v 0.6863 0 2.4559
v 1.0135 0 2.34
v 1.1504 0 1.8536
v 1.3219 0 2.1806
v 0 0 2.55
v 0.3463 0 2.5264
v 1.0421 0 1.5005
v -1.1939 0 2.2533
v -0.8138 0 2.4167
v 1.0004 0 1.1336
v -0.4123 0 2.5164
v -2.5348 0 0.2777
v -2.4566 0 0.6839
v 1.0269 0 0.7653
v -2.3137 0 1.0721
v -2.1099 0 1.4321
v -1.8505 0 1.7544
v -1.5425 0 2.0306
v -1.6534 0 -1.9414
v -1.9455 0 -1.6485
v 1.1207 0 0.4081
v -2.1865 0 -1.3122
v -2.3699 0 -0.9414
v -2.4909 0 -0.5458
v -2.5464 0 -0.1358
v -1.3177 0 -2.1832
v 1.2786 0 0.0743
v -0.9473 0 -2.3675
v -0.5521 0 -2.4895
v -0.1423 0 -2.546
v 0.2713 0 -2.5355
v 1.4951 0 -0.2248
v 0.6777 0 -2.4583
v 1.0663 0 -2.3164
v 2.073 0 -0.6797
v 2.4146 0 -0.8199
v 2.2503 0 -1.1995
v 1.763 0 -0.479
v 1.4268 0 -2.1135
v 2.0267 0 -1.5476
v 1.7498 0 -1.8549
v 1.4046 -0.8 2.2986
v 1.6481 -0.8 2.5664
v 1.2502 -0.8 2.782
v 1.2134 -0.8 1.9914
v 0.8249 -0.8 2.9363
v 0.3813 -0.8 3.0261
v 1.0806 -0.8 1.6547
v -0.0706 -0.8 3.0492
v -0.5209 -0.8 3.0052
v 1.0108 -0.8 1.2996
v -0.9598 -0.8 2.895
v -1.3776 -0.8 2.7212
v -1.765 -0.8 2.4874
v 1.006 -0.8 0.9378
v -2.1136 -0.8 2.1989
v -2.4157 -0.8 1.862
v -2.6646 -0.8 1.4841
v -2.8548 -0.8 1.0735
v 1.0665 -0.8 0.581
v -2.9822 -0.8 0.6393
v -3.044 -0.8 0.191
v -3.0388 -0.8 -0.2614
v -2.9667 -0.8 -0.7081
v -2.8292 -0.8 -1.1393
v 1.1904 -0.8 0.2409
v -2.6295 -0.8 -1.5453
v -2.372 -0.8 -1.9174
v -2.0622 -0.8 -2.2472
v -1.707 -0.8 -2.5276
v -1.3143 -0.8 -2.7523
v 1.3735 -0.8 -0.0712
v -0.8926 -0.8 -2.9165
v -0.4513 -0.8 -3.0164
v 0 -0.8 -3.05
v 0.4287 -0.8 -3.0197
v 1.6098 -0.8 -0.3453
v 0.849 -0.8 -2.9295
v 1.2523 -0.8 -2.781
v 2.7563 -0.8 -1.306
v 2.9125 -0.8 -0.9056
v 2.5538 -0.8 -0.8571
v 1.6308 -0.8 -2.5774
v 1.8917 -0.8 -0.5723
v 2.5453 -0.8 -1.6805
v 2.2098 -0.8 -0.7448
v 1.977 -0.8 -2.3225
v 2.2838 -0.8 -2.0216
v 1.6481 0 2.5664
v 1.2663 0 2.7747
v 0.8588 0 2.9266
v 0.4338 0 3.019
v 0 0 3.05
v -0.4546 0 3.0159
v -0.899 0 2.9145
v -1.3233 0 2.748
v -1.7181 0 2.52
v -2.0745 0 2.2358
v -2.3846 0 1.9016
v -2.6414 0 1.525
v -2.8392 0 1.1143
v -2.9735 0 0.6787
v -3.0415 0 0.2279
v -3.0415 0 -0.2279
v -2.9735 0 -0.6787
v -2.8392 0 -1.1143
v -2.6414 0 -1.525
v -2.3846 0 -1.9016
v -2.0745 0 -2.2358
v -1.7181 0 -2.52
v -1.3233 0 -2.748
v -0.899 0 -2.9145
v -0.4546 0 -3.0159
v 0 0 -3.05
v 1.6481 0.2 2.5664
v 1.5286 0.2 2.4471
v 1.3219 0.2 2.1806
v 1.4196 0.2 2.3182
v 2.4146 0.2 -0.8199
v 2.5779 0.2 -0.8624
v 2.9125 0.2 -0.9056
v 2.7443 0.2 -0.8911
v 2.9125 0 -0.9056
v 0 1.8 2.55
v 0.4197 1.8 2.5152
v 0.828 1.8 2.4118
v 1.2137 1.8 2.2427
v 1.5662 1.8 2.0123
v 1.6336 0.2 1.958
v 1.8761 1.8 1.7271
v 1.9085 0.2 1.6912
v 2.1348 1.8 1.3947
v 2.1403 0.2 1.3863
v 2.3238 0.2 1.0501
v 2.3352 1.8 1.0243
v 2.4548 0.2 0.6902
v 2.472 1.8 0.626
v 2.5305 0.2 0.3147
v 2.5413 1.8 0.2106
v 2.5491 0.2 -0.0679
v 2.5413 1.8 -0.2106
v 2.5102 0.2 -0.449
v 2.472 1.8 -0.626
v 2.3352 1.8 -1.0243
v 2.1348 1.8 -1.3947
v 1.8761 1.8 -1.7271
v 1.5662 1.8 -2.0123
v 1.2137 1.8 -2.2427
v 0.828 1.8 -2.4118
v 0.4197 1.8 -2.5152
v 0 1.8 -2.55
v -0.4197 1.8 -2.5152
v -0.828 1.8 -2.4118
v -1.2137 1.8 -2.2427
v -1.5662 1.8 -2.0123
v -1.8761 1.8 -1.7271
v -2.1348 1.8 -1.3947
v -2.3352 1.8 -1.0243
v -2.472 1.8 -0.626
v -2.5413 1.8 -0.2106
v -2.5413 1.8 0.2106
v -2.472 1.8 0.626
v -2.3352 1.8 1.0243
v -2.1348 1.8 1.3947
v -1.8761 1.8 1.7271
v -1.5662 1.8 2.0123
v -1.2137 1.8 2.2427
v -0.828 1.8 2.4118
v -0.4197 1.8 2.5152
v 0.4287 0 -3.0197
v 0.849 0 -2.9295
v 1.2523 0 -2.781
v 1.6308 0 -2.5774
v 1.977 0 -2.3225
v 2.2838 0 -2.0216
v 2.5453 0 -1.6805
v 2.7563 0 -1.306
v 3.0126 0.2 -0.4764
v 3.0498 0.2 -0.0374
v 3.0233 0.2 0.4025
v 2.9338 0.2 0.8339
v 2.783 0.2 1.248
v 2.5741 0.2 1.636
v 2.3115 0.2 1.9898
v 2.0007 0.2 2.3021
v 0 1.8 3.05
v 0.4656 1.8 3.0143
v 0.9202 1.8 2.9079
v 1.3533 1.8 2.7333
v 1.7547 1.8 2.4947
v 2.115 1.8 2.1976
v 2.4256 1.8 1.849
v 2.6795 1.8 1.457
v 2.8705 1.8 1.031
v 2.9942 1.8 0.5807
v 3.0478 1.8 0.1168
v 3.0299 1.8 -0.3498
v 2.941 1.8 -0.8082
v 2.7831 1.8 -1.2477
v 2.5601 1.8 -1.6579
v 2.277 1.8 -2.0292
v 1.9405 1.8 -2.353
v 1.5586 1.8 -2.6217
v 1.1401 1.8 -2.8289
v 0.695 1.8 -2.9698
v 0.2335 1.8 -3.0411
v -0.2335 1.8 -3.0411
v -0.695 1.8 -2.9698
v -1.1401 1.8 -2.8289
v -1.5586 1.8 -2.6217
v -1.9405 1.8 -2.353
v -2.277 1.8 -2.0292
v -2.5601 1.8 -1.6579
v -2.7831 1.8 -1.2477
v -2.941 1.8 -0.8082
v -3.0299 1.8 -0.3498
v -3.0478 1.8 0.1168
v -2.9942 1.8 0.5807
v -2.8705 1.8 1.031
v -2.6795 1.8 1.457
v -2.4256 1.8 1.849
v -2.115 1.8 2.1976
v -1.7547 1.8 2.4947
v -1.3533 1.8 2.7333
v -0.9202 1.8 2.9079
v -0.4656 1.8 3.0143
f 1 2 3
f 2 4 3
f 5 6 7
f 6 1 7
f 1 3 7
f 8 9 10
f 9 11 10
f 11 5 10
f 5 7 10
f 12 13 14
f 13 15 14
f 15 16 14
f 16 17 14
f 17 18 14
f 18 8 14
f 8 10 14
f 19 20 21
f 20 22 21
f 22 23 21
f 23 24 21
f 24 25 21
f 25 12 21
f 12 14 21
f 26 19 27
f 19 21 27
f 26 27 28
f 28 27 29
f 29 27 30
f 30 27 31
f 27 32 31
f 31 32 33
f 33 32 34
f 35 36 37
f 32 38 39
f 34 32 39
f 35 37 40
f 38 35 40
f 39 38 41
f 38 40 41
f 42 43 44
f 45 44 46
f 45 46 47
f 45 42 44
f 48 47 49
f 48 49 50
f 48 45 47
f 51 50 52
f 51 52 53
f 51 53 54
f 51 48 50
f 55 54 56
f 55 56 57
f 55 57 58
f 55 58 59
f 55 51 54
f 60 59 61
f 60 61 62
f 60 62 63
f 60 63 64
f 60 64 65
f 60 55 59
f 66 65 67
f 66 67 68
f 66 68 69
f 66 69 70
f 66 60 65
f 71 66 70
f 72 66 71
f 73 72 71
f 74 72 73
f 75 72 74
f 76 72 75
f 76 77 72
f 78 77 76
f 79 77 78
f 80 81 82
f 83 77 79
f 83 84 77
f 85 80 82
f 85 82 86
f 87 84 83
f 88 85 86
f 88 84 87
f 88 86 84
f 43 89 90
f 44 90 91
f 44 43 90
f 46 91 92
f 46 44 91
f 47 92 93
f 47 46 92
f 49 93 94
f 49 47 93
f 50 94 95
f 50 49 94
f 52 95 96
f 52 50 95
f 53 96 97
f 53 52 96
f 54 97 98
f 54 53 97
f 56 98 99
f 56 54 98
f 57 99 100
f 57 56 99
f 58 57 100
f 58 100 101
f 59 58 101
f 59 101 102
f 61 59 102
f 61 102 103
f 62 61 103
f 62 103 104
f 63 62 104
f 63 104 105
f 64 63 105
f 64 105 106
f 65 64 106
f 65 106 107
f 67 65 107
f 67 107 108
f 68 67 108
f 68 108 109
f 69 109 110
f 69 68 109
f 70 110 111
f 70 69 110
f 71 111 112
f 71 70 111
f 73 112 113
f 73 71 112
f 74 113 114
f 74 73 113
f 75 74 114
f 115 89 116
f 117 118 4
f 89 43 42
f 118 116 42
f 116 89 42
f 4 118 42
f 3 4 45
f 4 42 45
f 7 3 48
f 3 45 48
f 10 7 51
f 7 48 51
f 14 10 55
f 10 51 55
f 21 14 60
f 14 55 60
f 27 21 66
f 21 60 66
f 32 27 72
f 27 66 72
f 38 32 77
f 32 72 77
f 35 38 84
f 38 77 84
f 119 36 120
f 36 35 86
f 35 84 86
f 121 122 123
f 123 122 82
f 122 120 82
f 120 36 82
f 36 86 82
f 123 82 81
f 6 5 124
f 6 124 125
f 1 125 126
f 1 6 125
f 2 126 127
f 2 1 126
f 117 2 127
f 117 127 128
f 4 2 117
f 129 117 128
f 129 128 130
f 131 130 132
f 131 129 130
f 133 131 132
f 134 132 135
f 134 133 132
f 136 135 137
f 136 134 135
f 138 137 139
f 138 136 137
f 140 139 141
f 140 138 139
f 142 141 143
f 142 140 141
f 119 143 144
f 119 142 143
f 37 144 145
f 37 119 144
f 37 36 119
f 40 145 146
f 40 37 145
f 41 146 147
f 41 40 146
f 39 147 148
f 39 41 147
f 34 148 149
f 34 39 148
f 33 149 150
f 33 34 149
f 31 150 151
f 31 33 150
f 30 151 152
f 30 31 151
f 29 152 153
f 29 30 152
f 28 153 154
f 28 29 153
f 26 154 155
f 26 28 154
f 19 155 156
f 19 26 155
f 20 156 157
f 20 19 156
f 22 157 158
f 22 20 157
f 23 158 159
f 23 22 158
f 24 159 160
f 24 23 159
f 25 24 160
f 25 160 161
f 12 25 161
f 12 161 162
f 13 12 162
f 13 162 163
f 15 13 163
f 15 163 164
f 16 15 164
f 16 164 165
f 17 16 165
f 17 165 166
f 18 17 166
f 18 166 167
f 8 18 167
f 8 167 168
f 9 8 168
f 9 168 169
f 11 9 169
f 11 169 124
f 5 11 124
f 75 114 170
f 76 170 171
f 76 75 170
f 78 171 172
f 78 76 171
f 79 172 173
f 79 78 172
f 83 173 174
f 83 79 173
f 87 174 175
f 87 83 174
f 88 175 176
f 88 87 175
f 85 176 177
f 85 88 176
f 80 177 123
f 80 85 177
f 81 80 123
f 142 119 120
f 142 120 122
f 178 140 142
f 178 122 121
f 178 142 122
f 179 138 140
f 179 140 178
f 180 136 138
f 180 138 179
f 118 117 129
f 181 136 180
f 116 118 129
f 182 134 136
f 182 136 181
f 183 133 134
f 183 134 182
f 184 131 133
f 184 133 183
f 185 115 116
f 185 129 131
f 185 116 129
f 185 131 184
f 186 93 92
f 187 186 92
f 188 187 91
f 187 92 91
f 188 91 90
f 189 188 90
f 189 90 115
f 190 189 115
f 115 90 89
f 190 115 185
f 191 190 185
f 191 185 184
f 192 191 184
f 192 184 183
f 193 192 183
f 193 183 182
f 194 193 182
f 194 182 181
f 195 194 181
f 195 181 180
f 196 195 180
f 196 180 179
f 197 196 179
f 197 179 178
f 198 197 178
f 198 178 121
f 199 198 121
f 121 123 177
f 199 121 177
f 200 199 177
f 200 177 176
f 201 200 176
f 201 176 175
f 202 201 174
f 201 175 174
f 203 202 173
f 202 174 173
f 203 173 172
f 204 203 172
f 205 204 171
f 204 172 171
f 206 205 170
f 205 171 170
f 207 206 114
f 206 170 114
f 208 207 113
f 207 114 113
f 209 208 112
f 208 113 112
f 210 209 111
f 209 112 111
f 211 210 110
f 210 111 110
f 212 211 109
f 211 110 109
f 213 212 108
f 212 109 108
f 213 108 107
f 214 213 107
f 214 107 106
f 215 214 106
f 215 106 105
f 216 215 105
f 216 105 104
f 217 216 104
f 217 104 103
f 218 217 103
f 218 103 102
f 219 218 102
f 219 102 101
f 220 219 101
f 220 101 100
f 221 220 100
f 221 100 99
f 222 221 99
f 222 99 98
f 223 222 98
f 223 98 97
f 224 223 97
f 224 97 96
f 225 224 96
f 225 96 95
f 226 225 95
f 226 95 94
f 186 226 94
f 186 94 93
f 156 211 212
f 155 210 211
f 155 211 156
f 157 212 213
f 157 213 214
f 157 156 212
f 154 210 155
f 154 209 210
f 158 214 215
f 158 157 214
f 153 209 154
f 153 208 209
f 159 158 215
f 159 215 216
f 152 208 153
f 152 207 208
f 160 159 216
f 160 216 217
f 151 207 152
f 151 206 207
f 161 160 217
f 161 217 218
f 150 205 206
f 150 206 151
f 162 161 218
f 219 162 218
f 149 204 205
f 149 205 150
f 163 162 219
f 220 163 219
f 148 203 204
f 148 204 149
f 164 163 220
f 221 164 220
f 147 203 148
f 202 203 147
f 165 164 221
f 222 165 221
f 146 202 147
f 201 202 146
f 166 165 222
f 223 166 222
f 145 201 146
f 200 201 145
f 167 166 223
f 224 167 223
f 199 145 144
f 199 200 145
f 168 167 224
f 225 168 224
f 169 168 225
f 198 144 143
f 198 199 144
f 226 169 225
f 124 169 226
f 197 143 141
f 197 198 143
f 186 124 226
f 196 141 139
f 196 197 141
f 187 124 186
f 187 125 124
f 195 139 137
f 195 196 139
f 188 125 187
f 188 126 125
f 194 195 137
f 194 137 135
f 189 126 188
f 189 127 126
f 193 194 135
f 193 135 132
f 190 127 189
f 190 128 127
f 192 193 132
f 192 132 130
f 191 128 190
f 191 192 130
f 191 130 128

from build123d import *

# Parameters (mm, degrees)
SKETCH_1_R          = 3.05
SKETCH_1_R_2        = 2.55
EXTRUDE_1_DEPTH     = 1.8
EXTRUDE_START       = 0.8
SKETCH_2_R          = 3.05
EXTRUDE_2_DEPTH     = 0.8
SKETCH_3_R          = 2
CUT_EXTRUDE_1_DEPTH = 1


with BuildPart() as part:
    # 草图1 → 凸台-拉伸1 (new body)
    with BuildSketch(Plane(origin=(0, 0, 0), x_dir=(1, 0, 0), z_dir=(0, 1, 0))):
        with Locations(Location((0, 0, 0), (0, 0, 270))):
            Circle(SKETCH_1_R)
        with Locations(Location((0, 0, 0), (0, 0, 270))):
            Circle(SKETCH_1_R_2, mode=Mode.SUBTRACT)
    extrude(amount=EXTRUDE_1_DEPTH)

    # 草图2 → 凸台-拉伸2 (add)
    with BuildSketch(Plane.XZ.offset(EXTRUDE_START)):
        with Locations(Location((0, 0, 0), (0, 0, 270))):
            Circle(SKETCH_2_R)
    extrude(amount=-EXTRUDE_2_DEPTH)

    # 草图3 → 切除-拉伸1 (cut)
    with BuildSketch(Plane.XZ.offset(0.8)):
        with Locations((3, 1.092527685)):
            Circle(SKETCH_3_R)
    extrude(amount=-CUT_EXTRUDE_1_DEPTH, mode=Mode.SUBTRACT)


solid = part.part
